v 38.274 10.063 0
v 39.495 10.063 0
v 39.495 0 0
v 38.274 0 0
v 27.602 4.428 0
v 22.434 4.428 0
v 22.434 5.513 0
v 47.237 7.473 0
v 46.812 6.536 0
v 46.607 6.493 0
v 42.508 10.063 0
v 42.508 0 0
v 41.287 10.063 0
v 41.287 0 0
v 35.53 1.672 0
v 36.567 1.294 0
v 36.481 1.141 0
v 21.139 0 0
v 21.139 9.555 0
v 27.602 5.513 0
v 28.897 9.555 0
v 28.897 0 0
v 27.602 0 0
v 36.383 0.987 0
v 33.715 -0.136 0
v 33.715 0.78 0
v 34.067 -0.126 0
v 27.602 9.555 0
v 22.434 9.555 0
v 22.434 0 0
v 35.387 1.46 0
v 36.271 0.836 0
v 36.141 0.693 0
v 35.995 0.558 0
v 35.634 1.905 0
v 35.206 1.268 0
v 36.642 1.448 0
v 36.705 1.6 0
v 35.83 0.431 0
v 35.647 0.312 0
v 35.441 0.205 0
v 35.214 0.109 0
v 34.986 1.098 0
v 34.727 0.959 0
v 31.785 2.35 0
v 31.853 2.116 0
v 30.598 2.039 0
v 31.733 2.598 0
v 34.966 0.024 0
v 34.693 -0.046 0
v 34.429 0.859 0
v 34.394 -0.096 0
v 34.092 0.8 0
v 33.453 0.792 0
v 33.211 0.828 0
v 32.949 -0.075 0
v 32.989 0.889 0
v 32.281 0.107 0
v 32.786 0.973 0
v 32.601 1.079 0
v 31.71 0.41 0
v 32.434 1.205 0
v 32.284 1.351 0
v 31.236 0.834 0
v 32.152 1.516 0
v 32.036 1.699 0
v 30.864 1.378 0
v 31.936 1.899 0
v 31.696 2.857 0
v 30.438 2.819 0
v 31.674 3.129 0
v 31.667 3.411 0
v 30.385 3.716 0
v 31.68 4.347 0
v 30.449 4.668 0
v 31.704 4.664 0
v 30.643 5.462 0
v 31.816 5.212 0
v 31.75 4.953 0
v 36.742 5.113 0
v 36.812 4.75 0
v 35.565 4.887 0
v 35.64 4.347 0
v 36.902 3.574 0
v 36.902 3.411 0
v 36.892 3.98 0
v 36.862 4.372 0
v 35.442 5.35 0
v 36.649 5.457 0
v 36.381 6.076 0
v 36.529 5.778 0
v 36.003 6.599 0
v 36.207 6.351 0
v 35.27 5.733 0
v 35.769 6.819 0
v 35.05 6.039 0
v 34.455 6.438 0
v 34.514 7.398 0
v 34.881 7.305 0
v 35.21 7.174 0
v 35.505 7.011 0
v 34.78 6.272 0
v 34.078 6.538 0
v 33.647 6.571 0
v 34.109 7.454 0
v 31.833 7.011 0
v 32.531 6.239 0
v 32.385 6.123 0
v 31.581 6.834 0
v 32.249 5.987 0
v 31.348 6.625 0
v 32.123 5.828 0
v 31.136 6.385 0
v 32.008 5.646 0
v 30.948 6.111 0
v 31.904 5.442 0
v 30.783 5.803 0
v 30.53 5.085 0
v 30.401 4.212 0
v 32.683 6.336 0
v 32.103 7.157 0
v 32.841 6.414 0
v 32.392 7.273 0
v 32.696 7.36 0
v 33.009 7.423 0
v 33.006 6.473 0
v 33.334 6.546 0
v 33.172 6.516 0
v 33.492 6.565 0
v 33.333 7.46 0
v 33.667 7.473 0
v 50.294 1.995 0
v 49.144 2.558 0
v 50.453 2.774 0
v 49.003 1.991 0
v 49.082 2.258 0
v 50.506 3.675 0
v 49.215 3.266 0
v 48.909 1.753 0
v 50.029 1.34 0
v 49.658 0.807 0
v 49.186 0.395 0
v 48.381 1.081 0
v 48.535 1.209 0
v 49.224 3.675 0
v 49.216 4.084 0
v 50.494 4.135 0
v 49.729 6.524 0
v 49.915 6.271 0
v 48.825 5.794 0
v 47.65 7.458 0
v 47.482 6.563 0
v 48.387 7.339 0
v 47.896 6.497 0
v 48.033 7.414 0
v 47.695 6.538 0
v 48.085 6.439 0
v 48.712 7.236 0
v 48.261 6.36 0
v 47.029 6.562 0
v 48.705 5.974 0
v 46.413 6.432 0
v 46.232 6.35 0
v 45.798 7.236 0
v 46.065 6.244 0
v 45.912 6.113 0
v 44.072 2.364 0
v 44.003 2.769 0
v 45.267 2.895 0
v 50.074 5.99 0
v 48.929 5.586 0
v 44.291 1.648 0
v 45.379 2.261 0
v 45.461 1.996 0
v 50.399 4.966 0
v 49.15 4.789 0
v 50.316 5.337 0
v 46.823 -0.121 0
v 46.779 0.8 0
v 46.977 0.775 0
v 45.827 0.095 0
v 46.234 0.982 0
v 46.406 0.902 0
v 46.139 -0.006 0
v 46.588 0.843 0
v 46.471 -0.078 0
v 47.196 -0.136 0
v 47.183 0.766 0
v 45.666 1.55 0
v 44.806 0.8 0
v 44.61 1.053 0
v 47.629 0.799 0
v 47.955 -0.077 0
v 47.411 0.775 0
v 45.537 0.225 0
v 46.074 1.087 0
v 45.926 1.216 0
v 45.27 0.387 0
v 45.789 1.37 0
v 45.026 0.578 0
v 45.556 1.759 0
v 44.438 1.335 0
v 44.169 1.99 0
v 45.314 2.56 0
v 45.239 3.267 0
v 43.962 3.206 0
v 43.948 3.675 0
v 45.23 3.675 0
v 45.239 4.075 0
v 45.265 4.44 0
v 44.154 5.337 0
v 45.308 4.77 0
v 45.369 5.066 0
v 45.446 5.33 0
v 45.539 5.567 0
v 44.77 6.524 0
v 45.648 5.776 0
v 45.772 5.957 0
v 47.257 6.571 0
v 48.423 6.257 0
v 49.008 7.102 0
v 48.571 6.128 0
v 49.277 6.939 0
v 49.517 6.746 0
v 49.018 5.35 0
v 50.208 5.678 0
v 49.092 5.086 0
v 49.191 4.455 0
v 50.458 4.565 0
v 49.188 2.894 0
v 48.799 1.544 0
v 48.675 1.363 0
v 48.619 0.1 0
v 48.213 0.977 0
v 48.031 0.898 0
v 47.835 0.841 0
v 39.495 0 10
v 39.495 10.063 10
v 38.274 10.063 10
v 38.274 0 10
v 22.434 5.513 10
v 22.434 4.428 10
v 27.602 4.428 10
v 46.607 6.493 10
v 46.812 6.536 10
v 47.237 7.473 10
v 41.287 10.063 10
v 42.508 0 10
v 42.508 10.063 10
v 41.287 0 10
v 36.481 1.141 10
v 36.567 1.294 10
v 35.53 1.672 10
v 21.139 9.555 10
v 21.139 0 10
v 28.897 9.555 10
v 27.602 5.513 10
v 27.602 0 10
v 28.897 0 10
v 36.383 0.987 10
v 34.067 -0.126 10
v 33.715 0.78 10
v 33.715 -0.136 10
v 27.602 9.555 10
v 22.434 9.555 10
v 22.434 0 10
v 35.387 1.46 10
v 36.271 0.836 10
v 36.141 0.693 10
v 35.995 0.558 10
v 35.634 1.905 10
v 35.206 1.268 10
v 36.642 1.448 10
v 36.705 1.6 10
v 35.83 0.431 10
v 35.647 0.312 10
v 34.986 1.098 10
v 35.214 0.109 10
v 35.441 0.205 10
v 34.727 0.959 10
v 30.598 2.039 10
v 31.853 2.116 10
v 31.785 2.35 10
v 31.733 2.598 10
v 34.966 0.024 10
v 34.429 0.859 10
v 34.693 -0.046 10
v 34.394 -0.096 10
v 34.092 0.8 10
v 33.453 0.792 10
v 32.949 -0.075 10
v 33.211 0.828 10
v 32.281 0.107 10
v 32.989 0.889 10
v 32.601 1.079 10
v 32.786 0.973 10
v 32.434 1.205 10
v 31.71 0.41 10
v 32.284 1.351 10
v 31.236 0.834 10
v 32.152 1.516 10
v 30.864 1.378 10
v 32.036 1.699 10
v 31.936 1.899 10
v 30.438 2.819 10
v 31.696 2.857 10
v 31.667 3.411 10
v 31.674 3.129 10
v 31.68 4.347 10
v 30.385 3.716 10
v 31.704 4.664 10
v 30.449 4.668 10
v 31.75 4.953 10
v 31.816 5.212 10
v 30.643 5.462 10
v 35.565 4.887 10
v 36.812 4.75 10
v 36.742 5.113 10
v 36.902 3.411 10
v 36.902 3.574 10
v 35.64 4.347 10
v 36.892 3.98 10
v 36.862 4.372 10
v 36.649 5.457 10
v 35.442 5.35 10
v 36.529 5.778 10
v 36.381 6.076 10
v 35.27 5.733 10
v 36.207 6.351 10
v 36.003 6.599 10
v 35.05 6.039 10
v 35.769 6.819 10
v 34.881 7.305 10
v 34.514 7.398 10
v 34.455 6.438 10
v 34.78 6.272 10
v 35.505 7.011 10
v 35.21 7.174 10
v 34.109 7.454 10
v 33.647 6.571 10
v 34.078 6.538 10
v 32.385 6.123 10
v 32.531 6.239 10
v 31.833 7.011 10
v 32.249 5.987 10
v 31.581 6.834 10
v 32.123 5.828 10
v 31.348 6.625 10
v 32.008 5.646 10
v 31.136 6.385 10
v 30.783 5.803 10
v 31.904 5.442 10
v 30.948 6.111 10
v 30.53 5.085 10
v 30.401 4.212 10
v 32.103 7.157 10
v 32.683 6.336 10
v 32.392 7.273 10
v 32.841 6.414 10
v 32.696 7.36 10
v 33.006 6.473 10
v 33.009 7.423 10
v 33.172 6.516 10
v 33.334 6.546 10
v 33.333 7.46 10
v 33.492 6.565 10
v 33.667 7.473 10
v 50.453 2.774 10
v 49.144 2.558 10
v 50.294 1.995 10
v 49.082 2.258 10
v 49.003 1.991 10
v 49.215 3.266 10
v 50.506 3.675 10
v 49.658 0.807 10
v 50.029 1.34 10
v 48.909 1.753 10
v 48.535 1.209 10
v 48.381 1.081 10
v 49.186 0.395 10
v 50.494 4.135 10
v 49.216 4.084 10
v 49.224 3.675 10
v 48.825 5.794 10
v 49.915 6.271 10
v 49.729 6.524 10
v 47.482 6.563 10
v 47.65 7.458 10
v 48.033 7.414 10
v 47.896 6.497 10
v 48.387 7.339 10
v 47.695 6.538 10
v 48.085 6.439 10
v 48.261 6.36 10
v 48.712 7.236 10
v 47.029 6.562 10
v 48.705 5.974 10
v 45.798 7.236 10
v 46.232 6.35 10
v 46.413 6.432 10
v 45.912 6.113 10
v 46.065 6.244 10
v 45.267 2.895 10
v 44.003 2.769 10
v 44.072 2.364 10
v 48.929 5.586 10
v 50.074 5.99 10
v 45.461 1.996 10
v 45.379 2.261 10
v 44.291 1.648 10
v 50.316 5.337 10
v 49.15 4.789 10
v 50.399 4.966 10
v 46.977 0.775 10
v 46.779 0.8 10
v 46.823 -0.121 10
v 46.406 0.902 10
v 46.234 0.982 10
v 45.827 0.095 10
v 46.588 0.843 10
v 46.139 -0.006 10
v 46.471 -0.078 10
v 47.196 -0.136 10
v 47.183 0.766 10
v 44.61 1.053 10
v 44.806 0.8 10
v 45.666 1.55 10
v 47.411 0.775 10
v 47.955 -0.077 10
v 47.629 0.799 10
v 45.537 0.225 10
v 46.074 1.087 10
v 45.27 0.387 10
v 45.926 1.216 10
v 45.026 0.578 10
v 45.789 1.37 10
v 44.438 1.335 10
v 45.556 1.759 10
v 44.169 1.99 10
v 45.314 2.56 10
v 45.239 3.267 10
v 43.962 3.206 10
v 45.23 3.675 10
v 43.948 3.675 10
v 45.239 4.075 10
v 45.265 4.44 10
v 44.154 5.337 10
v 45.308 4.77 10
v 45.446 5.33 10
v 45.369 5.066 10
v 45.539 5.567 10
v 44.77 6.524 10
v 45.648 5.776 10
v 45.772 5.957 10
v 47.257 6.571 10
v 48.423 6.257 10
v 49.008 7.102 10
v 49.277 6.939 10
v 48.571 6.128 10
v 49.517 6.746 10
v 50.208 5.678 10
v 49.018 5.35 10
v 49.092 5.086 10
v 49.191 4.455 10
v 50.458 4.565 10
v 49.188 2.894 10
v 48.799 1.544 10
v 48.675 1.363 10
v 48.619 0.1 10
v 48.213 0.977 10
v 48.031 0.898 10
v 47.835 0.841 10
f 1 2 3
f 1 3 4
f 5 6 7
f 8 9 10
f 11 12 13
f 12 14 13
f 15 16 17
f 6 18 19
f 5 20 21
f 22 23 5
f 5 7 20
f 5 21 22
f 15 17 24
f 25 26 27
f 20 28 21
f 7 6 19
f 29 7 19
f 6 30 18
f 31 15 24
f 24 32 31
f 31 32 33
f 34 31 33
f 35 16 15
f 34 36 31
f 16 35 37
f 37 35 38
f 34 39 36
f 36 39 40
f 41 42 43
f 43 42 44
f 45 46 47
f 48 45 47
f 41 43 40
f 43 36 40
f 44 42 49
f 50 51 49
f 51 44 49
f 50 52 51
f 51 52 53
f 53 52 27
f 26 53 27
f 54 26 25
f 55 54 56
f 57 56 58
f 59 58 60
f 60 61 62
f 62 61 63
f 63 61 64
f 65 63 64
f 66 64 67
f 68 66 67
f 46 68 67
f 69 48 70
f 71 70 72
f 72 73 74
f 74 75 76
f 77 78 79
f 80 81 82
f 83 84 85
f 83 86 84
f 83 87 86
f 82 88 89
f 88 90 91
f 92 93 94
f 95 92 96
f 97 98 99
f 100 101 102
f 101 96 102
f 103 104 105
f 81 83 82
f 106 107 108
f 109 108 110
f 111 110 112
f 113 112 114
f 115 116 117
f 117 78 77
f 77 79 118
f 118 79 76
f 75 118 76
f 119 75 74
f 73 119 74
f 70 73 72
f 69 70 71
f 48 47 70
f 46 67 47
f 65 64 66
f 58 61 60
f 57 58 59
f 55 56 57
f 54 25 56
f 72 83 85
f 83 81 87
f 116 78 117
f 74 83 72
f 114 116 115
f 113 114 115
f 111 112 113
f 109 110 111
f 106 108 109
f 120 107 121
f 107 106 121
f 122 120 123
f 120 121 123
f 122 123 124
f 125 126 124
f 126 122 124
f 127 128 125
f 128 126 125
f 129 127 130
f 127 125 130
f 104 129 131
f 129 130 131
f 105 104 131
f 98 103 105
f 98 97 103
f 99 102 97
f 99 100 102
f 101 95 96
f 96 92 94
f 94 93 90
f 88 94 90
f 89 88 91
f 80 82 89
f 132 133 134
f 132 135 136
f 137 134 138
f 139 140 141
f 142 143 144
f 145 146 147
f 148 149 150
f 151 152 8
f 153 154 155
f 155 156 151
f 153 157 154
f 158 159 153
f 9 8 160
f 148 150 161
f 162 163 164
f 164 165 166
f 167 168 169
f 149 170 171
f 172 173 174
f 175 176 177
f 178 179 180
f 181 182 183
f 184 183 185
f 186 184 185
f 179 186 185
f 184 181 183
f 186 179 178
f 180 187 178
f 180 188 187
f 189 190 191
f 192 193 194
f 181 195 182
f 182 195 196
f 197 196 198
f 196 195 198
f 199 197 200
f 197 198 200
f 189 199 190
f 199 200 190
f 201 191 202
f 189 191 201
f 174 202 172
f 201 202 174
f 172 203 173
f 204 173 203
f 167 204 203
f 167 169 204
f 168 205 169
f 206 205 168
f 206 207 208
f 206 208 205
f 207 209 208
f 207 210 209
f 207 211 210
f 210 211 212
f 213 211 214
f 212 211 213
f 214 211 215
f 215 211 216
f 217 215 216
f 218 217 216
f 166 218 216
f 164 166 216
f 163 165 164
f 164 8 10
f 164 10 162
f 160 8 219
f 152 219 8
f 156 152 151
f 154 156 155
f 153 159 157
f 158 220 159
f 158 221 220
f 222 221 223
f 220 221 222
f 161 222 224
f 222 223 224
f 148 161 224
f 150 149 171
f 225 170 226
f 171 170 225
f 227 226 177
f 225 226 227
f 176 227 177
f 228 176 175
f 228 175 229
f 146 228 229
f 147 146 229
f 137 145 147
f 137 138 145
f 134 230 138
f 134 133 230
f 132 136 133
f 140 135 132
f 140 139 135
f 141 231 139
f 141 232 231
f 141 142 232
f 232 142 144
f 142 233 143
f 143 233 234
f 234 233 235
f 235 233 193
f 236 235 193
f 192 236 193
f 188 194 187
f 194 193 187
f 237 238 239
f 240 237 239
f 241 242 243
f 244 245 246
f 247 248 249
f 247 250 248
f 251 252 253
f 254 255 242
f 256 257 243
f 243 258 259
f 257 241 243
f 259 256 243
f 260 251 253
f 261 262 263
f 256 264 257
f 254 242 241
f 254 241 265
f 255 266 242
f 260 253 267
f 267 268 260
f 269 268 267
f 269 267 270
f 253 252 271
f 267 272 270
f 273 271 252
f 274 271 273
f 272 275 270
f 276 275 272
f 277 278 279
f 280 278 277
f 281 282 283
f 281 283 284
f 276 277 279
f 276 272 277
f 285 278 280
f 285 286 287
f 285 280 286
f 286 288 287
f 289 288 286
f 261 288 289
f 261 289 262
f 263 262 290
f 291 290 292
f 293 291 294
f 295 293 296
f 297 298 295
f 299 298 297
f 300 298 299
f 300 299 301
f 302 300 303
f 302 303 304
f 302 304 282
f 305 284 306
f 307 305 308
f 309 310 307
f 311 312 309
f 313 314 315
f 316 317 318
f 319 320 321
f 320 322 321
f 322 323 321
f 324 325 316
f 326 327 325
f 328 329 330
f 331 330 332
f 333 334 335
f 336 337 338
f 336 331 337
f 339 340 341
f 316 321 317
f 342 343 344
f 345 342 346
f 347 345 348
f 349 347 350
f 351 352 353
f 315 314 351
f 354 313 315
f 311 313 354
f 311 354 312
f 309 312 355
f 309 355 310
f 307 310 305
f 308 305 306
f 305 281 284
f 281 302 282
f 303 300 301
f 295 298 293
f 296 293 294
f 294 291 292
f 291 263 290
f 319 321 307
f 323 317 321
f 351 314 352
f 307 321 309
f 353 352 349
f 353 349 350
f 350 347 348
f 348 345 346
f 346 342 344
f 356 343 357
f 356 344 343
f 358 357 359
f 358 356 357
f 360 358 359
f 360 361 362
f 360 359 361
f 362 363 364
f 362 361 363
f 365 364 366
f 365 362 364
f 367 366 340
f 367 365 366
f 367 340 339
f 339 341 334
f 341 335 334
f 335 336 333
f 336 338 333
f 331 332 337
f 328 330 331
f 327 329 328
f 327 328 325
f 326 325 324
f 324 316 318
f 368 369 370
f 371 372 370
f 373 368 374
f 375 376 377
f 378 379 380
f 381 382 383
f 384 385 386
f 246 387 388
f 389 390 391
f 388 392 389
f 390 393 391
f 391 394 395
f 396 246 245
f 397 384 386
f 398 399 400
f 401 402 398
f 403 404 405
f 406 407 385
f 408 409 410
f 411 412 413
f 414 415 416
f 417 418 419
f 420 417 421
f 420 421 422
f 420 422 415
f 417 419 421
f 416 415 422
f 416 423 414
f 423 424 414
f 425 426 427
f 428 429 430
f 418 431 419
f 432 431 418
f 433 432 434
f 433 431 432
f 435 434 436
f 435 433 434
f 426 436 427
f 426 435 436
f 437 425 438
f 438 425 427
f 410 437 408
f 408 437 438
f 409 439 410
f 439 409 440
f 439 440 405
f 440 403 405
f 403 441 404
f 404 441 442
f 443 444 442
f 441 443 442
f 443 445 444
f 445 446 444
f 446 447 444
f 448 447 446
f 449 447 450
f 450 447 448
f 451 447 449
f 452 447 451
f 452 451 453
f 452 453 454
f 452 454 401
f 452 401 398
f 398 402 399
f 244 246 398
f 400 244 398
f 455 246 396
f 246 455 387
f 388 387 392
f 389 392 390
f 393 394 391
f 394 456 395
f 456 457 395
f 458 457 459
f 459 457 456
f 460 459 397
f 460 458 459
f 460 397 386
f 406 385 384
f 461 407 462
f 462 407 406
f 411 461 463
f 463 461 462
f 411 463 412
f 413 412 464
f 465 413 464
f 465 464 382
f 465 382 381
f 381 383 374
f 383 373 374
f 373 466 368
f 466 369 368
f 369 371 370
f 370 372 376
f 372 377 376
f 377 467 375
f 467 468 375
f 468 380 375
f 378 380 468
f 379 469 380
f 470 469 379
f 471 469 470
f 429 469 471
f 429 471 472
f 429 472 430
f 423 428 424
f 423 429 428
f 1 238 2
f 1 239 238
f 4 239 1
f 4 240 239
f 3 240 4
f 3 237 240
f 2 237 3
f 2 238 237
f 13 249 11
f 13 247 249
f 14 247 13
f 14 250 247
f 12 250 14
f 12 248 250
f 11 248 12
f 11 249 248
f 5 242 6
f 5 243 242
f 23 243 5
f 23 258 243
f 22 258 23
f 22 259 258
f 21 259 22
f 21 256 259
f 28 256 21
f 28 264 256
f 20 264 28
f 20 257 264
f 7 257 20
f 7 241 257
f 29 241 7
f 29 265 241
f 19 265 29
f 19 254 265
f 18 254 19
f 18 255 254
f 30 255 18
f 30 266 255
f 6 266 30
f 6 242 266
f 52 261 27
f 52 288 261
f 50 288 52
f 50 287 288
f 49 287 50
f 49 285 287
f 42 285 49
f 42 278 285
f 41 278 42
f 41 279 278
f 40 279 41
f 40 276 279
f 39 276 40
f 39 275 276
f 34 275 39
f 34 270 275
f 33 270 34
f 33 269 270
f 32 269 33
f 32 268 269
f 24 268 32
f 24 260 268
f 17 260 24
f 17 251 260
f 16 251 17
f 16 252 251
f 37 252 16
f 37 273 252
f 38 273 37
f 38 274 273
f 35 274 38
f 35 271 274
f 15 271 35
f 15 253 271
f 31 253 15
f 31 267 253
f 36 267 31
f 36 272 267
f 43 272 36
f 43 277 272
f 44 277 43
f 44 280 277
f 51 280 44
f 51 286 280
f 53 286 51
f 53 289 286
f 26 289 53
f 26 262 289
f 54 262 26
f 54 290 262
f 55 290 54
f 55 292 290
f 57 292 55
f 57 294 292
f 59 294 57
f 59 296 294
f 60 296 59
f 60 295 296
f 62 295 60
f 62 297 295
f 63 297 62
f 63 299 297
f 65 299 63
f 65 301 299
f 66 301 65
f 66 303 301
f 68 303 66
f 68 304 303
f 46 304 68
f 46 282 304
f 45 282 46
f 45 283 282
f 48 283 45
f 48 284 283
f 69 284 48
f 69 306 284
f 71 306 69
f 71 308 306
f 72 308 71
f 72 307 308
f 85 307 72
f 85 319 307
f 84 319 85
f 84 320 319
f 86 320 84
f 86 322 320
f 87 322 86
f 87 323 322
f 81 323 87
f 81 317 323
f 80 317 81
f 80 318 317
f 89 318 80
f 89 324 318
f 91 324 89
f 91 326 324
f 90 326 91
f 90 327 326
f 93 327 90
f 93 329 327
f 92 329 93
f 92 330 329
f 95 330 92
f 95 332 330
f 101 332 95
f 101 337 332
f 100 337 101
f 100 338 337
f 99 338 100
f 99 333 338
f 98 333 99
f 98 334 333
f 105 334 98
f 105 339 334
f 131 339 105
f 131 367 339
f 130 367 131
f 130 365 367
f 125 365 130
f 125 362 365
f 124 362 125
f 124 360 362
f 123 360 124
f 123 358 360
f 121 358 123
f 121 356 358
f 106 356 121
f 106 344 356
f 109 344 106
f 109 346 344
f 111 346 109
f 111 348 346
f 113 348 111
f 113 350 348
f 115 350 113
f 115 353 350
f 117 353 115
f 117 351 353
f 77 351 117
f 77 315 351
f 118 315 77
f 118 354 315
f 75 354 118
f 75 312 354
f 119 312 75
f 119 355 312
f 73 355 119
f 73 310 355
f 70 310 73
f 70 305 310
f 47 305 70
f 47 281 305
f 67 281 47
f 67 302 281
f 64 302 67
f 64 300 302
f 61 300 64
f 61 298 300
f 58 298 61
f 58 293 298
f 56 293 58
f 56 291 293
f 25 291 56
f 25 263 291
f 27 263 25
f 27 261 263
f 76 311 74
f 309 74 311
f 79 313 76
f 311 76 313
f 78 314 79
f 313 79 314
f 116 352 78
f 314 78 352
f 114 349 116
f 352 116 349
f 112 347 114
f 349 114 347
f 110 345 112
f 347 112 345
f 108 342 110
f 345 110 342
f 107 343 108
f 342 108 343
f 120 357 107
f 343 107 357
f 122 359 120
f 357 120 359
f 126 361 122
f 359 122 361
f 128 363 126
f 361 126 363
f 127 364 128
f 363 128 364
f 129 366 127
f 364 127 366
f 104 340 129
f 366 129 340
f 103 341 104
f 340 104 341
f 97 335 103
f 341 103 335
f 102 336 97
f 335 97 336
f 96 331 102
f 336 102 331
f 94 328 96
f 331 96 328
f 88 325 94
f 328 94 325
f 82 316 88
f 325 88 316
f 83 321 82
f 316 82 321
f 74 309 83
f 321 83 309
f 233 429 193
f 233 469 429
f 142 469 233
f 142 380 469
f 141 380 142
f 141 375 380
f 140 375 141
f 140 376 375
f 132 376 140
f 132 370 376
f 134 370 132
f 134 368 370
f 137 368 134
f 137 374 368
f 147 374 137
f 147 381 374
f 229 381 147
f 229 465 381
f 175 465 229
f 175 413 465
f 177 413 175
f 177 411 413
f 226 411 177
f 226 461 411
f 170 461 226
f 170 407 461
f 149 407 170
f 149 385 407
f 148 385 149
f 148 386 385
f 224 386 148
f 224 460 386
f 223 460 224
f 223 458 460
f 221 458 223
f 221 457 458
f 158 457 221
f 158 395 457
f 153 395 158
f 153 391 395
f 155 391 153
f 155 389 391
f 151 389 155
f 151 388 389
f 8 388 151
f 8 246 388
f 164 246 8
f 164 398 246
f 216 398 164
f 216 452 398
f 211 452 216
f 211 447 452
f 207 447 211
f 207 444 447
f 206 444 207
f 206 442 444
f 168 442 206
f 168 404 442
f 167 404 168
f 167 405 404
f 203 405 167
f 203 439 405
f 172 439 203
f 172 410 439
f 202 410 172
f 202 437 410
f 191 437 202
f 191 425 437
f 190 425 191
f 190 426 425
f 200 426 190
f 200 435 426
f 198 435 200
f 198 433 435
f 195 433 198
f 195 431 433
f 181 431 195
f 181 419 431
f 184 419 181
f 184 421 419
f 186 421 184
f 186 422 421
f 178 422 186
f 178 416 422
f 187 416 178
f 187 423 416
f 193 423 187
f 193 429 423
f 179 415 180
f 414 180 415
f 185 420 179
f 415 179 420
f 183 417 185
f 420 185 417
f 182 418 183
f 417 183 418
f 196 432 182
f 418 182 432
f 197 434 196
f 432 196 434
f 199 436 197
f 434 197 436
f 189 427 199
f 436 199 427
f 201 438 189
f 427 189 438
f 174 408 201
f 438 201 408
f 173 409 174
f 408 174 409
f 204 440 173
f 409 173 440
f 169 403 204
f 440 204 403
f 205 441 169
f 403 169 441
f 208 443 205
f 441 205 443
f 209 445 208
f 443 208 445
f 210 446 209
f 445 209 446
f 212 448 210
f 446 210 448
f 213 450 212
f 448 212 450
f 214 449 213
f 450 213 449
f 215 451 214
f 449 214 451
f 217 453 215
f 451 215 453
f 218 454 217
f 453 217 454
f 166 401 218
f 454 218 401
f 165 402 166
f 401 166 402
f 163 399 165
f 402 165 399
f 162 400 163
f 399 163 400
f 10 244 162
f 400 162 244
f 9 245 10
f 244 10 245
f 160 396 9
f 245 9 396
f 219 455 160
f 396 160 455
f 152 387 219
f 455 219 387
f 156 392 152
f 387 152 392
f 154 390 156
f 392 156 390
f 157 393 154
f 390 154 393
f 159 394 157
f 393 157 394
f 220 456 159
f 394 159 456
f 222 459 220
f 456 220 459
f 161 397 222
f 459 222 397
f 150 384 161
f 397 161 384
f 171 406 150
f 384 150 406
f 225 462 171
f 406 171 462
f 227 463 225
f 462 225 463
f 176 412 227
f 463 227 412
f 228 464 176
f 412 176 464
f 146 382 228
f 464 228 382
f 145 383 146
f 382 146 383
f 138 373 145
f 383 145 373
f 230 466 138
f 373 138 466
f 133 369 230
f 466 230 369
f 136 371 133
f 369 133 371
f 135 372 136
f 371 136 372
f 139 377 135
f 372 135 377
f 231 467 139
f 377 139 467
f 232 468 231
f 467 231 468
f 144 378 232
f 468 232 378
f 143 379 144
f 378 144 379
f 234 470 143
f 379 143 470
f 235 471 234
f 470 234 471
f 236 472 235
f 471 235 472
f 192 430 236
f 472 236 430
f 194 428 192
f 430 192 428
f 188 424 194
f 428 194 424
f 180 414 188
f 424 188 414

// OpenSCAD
linear_extrude(height = 10)
    multmatrix([[1,0,0,20],[0,1,0,0],[0,0,1,0],[0,0,0,1]])
        text("Hello");
